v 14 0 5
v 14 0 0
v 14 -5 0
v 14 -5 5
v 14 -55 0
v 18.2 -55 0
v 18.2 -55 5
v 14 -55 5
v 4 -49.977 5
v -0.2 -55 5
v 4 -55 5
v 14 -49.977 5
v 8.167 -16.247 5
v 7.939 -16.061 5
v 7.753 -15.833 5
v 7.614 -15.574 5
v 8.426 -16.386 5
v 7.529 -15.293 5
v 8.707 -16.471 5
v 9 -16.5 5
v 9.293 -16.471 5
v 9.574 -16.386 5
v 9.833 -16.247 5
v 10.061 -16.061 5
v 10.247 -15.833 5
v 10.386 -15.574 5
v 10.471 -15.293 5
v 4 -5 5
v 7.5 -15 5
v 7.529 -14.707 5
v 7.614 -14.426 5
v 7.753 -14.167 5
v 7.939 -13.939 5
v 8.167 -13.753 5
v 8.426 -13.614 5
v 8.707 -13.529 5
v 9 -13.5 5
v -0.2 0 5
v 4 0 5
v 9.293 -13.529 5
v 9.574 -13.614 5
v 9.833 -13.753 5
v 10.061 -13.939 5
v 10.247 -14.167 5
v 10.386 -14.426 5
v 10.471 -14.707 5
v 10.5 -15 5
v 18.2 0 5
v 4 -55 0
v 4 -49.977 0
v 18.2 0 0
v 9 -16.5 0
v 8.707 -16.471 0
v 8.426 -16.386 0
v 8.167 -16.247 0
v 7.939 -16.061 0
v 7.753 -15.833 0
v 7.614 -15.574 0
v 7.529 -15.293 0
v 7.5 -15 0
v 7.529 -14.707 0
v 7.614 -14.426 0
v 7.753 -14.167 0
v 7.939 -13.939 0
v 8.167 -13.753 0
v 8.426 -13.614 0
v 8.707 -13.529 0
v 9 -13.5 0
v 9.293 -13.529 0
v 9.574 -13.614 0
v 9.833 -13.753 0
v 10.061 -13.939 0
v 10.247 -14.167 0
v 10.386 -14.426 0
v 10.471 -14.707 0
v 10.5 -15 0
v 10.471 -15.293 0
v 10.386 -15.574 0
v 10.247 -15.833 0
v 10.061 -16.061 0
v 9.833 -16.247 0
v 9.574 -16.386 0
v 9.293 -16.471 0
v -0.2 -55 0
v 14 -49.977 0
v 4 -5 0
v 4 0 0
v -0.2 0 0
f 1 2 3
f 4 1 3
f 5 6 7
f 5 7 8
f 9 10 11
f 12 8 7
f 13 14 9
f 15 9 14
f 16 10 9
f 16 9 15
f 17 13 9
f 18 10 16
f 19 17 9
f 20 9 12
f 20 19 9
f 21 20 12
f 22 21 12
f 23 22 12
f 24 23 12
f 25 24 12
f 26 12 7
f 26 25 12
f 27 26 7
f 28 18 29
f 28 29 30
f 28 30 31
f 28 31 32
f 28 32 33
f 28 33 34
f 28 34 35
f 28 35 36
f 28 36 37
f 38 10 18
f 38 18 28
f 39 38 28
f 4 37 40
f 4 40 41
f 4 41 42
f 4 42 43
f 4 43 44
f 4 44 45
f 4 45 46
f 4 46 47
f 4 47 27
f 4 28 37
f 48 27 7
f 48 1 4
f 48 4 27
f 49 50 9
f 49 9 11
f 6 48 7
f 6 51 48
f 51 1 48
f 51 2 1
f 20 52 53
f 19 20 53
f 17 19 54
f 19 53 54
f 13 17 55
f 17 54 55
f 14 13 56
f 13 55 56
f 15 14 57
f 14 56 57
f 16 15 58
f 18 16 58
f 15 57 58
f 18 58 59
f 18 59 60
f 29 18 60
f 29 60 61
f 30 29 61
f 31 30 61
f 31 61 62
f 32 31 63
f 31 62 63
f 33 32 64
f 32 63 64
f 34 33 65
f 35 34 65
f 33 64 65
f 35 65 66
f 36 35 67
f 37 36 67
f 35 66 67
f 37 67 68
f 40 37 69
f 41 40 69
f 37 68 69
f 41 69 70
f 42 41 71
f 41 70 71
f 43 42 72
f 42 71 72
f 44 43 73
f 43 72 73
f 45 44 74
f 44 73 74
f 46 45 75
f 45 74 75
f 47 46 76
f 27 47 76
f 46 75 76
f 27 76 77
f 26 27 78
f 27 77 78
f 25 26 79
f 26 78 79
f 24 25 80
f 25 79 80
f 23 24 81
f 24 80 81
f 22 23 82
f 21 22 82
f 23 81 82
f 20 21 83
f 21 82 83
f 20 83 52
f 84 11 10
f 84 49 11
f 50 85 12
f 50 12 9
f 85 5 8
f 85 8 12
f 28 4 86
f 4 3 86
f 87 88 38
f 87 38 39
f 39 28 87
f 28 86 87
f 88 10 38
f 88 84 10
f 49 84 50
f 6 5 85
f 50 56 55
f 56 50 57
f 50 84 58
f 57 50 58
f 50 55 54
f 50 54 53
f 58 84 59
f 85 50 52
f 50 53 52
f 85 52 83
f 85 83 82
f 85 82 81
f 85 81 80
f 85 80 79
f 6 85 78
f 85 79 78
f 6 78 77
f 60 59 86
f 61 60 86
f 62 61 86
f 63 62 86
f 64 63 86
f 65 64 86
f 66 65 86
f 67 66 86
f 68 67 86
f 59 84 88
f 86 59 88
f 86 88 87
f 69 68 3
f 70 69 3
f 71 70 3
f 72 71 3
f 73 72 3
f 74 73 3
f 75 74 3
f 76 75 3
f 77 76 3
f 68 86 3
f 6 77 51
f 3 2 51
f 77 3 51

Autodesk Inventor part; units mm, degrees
ref_plane "YZ Plane" through (0, 0, 0) normal (1, 0, 0) x (0, 1, 0)
ref_plane "XZ Plane" through (0, 0, 0) normal (0, 1, 0) x (-1, 0, 0)
ref_plane "XY Plane" through (0, 0, 0) normal (0, 0, 1) x (1, 0, 0)
sketch "Sketch1" plane through (0, 0, 0) normal (0, 0, 1) x (1, 0, 0)
  line L0 (0, 0) -> (18, 0) construction
  line L1 (18, -55) -> (0, -55) construction
  line L2 (-0.2, 0) -> (4, 0)
  line L3 (18.2, 0) -> (18.2, -55)
  line L4 (18.2, -55) -> (14, -55)
  line L5 (-0.2, -55) -> (-0.2, 0)
  line L6 (14, 0) -> (14, -5)
  line L7 (14, -5) -> (4, -5)
  line L8 (4, -5) -> (4, 0)
  line L9 (14, 0) -> (18.2, 0)
  line L10 (14, -55) -> (14, -49.9766)
  line L11 (14, -49.9766) -> (4, -49.9766)
  line L12 (4, -49.9766) -> (4, -55)
  line L13 (4, -55) -> (-0.2, -55)
  point P0 (1, -55)
  point P1 (16.8146, 0)
  point P2 (4, -2.5)
  point P3 (4, -52.4883)
  point P4 (14, -52.4883)
  point P5 (14, -2.5)
  dimension "d33" = 18.4
  dimension "d34" = 0.2
  dimension "d35" = 4.2
  dimension "d36" = 4.2
  dimension "d37" = 5
  dimension "d38" = 0
  dimension "d39" = 5.0234
  dimension "d40" = 0
extrude "Extrusion1" add sketch "Sketch1" along normal blind 5
sketch "Sketch3" plane through (0, 0, 5) normal (0, 0, 1) x (1, 0, 0)
  line L0 (-0.2, 0) -> (-0.2, -55) projected
  circle A0 centre (9, -15) radius 1.5
  line L1 (4, 0) -> (-0.2, 0) projected
  point P0 (0, 0)
  point P1 (1, -55)
  dimension "d21" = 3
  dimension "d25" = 9.2
  dimension "d41" = 15
hole "Hole2" at (9, -15, 5) direction (0, 0, -1) diameter 3 depth 8 tip angle 118
equation "\"d26\" = d21"
properties part number "Z-Kettenhalter"
